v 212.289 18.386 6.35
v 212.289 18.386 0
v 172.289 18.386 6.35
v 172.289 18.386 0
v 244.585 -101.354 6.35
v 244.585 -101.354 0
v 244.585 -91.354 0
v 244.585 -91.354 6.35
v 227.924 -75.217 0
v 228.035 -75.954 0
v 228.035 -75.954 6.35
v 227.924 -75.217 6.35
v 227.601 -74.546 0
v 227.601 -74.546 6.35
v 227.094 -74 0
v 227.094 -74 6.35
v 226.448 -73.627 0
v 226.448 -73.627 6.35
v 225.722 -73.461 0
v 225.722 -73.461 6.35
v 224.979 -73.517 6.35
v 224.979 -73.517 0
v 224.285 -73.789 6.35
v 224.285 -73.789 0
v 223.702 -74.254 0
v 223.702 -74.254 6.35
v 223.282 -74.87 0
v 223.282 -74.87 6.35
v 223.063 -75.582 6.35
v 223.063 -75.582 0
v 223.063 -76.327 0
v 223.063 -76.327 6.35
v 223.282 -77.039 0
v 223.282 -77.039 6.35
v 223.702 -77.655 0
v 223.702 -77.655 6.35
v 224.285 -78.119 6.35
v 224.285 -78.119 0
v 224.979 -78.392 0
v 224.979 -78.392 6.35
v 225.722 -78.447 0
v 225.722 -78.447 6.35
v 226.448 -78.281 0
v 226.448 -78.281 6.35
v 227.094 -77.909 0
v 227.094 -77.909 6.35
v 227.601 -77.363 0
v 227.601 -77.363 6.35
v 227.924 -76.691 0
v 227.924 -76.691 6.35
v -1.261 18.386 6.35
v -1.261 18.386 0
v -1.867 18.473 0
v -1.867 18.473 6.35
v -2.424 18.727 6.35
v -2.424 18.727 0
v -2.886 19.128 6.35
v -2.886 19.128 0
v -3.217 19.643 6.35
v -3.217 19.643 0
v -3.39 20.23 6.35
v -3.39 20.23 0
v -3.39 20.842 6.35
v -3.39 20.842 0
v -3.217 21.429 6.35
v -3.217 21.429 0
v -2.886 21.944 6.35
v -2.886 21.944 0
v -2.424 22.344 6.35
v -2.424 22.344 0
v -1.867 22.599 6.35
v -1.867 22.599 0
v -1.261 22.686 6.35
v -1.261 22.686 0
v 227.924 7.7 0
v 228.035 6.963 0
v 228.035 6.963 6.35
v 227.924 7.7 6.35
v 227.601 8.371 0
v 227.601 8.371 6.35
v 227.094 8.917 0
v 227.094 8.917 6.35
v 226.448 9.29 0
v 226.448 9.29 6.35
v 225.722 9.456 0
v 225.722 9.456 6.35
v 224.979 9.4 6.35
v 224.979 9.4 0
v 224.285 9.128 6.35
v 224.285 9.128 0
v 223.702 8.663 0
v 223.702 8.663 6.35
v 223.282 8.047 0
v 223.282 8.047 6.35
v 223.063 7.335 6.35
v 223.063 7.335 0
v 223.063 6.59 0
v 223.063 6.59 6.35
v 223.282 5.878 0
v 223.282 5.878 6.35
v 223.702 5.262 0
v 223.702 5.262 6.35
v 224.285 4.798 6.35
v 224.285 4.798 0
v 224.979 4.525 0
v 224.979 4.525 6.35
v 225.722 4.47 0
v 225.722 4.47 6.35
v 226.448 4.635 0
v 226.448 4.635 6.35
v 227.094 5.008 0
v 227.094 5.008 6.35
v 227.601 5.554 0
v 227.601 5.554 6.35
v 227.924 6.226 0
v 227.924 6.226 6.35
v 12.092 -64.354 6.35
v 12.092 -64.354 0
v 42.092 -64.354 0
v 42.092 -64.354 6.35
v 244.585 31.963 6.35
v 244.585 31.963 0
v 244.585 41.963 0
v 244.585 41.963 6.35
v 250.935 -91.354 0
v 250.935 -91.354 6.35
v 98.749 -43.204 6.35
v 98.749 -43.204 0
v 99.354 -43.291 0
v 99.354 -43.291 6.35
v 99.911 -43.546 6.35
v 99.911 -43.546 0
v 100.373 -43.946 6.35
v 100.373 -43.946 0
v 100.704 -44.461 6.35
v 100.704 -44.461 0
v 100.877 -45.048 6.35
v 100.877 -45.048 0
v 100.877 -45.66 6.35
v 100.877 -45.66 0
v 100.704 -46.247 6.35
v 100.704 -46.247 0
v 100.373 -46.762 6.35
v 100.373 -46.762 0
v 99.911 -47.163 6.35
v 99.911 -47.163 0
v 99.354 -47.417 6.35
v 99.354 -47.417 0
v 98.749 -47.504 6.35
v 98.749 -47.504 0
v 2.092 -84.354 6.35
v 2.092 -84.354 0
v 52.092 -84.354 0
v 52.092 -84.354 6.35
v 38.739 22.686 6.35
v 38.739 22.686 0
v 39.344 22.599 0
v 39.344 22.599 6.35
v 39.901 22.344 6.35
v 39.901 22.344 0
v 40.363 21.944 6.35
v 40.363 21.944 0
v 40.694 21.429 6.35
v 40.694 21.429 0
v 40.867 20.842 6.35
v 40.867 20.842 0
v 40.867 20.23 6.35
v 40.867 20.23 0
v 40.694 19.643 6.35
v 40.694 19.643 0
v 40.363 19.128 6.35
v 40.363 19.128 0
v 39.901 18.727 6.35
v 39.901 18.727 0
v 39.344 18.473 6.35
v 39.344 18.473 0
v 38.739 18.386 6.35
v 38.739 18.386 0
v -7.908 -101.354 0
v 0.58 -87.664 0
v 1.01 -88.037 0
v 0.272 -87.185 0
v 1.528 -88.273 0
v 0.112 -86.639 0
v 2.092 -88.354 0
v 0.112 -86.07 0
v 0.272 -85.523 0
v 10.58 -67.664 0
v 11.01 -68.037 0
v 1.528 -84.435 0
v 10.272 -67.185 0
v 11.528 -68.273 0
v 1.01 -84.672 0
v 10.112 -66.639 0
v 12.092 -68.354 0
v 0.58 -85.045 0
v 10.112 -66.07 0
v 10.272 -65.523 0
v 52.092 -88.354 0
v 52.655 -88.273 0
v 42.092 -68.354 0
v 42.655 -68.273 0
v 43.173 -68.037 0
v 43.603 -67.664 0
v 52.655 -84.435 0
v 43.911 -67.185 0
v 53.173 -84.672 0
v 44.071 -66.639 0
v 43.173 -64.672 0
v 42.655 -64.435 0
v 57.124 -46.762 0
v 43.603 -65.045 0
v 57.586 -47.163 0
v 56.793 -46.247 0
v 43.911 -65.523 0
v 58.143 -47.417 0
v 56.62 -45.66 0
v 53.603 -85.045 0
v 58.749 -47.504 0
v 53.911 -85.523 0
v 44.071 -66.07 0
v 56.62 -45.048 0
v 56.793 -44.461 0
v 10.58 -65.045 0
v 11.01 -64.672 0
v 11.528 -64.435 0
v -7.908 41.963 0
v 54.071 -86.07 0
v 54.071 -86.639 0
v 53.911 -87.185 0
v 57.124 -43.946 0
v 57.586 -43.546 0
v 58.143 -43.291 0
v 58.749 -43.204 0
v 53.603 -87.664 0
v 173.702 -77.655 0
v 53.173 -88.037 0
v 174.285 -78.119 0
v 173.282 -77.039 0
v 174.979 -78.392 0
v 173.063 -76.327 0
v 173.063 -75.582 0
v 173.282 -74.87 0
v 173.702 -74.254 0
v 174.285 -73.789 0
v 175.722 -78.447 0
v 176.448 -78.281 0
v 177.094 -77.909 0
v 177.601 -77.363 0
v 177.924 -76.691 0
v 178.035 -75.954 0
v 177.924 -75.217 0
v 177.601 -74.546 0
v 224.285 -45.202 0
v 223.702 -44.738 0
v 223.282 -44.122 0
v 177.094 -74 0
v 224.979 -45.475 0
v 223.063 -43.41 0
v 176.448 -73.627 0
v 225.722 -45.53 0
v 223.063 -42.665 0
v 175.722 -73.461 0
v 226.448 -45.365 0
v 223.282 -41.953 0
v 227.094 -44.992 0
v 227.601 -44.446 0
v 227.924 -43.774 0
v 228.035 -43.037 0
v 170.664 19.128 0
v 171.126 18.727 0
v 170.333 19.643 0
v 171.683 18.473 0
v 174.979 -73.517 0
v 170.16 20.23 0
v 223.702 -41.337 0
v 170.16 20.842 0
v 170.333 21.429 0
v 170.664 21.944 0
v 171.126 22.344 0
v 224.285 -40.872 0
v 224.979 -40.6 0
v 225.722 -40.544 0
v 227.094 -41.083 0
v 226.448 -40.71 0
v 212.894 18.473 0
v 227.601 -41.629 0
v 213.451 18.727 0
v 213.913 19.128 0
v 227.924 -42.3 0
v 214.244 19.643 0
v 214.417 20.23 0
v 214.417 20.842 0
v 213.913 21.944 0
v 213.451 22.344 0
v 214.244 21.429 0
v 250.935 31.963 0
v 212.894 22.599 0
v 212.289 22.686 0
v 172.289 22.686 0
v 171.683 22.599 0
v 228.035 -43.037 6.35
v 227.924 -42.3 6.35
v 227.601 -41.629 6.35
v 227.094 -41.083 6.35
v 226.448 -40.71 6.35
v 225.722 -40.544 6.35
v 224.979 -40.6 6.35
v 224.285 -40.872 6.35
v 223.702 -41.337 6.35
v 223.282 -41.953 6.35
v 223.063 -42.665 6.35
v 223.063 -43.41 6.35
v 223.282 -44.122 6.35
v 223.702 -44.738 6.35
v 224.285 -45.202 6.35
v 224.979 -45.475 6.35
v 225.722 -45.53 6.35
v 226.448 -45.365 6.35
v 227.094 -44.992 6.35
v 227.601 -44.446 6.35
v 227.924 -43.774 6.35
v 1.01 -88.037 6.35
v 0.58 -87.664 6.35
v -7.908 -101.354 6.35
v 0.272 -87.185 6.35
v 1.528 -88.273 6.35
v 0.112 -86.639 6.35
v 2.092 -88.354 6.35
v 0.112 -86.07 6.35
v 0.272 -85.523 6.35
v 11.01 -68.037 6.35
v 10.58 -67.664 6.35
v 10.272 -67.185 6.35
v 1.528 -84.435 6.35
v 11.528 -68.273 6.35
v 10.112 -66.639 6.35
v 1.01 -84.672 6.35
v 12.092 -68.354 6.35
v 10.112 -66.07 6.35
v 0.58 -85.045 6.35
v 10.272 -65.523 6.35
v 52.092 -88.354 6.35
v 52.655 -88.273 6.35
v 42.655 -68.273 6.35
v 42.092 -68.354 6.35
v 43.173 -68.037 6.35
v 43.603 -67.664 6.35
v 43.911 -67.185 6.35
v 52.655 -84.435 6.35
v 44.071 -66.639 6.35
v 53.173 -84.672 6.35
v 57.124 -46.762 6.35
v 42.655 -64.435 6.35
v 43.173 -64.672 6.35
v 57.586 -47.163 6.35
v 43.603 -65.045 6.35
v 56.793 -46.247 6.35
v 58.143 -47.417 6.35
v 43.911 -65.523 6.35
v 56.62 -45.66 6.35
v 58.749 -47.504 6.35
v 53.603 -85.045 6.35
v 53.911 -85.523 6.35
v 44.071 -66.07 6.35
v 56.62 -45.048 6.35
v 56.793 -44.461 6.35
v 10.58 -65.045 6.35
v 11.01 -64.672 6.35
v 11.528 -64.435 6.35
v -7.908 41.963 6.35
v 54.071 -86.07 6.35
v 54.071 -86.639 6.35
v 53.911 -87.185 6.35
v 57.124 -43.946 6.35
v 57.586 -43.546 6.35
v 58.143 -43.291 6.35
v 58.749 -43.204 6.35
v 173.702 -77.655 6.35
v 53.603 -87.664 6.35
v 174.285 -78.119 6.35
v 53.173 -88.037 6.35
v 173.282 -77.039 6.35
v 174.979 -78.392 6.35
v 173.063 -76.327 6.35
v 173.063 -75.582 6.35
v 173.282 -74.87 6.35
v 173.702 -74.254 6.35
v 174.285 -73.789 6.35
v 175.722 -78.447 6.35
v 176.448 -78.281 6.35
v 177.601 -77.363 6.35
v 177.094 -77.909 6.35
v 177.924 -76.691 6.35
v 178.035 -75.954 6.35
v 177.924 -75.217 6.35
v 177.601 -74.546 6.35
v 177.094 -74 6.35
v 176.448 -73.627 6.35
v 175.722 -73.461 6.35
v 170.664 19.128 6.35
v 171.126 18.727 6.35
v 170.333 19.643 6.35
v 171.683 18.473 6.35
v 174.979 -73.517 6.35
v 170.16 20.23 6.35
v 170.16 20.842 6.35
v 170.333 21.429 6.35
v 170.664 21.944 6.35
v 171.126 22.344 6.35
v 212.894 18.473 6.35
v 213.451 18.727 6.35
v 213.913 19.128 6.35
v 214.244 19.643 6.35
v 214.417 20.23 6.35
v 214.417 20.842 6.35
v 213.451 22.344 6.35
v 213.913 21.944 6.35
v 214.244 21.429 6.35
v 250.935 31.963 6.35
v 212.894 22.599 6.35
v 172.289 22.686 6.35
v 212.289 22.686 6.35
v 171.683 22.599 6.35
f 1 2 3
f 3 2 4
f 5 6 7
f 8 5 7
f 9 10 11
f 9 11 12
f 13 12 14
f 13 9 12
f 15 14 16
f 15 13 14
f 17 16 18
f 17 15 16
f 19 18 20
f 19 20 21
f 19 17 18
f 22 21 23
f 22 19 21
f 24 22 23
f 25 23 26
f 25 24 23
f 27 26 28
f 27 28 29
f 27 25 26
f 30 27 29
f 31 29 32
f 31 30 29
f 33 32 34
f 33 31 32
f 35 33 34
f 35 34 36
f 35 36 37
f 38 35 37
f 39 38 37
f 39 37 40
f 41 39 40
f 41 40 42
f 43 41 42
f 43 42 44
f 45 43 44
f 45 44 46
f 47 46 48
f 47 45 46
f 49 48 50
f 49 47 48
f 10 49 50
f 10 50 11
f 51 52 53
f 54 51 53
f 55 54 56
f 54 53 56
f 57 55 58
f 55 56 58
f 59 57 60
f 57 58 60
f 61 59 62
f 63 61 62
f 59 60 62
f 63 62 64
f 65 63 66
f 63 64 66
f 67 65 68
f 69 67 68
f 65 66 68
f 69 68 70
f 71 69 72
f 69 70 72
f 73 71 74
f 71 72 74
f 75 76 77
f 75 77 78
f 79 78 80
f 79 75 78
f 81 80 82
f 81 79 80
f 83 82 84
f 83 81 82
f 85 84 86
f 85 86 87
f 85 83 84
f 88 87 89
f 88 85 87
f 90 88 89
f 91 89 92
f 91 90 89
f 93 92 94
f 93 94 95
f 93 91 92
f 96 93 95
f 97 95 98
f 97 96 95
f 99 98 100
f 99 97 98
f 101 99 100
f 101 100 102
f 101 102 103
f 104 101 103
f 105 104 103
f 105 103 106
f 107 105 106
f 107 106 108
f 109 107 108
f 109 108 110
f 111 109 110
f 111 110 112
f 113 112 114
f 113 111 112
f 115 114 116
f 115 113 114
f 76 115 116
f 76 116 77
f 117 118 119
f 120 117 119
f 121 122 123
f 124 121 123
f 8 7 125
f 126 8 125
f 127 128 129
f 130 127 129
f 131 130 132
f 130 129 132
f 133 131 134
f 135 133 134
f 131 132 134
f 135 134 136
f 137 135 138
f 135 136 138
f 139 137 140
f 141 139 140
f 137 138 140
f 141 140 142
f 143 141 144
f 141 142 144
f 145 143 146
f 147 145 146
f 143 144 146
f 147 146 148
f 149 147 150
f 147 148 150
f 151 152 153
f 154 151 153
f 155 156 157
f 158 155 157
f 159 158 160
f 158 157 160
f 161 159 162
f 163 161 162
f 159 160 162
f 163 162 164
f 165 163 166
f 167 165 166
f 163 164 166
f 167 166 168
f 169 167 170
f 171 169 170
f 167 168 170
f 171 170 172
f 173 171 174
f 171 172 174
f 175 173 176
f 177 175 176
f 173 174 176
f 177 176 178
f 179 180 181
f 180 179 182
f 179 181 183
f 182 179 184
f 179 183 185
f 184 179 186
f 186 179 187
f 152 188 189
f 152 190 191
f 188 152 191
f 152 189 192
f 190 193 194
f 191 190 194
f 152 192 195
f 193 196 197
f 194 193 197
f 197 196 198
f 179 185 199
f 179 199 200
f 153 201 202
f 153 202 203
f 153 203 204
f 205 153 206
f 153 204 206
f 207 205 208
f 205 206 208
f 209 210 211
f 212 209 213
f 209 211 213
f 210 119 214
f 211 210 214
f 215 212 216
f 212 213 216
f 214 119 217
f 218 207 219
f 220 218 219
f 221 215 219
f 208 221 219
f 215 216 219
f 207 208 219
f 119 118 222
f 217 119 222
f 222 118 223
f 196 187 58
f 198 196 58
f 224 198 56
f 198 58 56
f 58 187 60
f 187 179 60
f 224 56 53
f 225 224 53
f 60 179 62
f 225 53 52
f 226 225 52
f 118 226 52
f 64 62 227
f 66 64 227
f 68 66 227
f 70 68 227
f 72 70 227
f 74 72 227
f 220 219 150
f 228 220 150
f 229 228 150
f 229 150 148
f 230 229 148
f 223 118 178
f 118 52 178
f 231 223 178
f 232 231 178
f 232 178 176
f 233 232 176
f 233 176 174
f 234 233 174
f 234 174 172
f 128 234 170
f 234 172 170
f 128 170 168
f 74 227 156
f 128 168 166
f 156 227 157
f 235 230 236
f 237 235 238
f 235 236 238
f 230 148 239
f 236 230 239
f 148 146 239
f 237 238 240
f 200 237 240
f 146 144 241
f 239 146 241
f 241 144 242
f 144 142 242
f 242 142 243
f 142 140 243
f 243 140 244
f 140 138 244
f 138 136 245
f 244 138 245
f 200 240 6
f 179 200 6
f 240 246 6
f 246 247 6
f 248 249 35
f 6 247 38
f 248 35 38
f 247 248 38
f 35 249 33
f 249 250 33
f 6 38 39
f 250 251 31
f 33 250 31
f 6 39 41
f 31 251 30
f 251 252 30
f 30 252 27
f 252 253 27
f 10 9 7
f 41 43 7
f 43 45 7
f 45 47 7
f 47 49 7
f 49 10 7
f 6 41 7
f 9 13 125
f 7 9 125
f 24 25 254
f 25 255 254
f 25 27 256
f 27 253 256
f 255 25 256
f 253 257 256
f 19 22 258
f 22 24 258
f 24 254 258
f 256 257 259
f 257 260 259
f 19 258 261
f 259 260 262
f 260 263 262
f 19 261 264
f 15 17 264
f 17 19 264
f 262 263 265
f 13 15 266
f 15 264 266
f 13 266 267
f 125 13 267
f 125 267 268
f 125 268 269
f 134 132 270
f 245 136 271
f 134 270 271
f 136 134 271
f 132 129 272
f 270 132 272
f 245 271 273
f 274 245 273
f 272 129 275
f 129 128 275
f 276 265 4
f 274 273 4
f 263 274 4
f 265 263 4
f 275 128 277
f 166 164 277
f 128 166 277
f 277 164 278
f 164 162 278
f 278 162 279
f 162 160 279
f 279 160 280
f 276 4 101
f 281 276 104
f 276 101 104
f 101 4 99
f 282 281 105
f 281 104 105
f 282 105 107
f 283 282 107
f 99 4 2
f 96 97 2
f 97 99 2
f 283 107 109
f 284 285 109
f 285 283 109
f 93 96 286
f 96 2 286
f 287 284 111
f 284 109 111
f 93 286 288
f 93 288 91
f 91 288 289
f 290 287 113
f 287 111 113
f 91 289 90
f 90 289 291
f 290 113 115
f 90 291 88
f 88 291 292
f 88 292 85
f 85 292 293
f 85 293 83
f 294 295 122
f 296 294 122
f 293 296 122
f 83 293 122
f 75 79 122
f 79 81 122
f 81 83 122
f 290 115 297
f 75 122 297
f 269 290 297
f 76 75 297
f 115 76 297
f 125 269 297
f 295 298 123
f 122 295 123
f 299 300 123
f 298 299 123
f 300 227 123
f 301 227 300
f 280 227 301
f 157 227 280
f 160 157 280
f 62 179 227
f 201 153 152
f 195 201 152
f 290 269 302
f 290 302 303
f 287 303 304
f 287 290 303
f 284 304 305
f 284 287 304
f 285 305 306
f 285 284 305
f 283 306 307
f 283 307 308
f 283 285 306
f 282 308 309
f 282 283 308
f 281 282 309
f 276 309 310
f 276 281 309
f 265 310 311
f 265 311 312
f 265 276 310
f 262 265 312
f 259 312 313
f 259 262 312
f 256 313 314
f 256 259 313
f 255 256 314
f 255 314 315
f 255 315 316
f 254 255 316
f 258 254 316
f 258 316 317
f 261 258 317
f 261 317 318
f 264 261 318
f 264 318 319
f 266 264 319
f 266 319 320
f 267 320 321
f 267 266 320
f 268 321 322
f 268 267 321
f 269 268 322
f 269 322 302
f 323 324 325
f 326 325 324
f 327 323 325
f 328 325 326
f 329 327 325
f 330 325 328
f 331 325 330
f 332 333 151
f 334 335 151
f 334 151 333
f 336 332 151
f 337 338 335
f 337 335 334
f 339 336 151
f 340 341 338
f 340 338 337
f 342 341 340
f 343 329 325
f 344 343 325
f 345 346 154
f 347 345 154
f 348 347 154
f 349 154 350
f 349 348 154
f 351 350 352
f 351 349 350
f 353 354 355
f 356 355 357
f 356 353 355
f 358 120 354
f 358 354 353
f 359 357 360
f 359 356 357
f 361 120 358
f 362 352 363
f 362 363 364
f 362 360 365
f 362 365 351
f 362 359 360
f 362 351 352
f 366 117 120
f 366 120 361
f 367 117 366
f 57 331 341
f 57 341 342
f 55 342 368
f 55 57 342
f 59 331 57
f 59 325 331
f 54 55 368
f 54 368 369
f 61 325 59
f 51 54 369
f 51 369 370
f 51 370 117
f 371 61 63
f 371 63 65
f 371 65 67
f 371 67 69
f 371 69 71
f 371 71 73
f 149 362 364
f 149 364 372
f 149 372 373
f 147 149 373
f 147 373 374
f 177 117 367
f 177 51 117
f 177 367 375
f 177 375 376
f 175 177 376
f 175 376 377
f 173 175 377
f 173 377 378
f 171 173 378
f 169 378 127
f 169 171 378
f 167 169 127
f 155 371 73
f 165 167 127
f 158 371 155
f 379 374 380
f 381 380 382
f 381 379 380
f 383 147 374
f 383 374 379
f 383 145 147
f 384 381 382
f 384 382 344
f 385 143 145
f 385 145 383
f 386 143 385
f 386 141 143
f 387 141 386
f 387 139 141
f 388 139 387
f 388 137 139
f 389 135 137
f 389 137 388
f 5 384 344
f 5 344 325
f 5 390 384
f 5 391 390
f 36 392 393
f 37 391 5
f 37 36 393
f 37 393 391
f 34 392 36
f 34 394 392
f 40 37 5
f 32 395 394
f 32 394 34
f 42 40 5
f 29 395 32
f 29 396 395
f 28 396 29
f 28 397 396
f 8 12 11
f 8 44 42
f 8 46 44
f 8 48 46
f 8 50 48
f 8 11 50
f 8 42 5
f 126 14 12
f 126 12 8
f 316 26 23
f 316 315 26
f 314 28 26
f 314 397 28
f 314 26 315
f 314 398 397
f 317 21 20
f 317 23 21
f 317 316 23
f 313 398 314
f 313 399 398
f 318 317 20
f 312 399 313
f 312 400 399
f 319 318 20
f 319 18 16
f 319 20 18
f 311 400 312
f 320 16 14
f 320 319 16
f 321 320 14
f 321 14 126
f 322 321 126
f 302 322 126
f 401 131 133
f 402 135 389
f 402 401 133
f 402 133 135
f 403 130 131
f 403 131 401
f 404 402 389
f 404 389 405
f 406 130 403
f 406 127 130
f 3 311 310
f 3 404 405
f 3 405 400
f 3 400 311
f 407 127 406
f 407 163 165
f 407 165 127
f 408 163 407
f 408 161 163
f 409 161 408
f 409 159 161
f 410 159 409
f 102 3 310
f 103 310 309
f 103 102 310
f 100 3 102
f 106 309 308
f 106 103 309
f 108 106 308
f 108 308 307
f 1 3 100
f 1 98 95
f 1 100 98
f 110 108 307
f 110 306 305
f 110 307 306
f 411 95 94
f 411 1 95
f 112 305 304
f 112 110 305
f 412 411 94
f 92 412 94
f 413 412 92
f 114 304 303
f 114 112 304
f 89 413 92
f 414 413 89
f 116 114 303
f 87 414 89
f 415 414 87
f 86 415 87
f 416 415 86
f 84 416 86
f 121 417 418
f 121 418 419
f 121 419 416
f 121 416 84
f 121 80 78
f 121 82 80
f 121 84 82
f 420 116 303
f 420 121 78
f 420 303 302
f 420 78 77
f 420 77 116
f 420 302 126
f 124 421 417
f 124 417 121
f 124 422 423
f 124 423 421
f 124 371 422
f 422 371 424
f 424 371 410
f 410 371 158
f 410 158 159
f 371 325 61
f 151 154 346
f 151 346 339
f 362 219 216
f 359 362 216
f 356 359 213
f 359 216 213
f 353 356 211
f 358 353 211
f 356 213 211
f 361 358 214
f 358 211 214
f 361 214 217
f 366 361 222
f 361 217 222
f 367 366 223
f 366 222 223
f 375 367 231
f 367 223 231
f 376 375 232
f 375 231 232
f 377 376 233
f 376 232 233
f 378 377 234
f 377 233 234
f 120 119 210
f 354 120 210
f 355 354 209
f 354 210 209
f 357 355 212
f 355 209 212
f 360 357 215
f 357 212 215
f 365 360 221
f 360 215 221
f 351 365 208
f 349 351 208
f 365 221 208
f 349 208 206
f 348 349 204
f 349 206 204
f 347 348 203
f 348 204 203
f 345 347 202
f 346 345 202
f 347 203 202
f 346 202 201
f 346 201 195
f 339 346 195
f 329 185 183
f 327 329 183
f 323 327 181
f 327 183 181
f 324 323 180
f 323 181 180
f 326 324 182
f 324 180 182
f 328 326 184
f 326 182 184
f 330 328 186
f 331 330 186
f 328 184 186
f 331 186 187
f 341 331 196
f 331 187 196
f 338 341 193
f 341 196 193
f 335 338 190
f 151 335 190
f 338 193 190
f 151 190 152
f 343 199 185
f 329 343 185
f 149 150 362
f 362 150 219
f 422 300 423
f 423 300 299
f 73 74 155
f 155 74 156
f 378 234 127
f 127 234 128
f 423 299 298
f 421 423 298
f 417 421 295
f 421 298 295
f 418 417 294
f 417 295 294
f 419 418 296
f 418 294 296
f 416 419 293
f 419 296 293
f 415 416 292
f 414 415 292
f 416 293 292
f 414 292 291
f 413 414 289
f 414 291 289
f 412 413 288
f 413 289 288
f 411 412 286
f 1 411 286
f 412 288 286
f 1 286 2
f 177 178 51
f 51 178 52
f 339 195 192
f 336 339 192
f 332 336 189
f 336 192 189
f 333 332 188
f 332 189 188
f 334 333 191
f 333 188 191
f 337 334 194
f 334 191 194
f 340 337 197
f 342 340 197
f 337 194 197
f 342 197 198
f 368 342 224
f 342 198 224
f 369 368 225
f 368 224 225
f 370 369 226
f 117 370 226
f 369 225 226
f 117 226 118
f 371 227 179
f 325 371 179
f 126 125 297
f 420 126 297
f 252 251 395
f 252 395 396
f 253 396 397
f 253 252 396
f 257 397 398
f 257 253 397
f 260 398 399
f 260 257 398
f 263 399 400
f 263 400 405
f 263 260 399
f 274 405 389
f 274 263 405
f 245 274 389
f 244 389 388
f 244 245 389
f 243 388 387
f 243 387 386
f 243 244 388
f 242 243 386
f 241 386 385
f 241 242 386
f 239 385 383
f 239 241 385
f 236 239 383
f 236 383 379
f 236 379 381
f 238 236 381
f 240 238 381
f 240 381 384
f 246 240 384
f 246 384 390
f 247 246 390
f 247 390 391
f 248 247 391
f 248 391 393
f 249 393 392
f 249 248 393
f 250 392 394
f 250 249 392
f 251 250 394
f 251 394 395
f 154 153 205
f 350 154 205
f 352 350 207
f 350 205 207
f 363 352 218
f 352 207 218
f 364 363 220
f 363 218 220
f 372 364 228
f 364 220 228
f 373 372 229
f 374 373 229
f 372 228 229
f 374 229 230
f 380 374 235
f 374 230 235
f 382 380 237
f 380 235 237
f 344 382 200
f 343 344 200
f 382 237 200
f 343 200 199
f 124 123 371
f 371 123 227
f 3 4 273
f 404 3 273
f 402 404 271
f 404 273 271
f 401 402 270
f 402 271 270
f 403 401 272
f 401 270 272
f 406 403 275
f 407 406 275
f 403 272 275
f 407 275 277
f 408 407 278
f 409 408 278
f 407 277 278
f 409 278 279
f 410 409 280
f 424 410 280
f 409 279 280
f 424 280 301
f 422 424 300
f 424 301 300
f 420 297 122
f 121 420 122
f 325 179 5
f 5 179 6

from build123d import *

# Parameters (mm, degrees)
SKETCH3_R           = 2.5
BOSS_EXTRUDE1_DEPTH = 6.35


with BuildPart() as part:
    # Sketch3 → Boss-Extrude1 (new body)
    with BuildSketch(Plane.XY):
        Polygon((244.584917863, 41.962665812), (-7.908318612, 41.962665812), (-7.908318612, -101.354312852), (244.584917863, -101.354312852), (244.584917863, -91.354312852), (250.934917863, -91.354312852), (250.934917863, 31.962665812), (244.584917863, 31.962665812), align=None)
        with Locations((225.534917863, -43.037334188)):
            Circle(SKETCH3_R, mode=Mode.SUBTRACT)
        with Locations((225.534917863, 6.962665812)):
            Circle(SKETCH3_R, mode=Mode.SUBTRACT)
        with Locations((225.534917863, -75.954312852)):
            Circle(SKETCH3_R, mode=Mode.SUBTRACT)
        with Locations((175.534917863, -75.954312852)):
            Circle(SKETCH3_R, mode=Mode.SUBTRACT)
        with BuildLine():
            Line((58.748599203, -43.204312852), (98.748599203, -43.204312852))
            ThreePointArc((98.748599203, -43.204312852), (100.898599203, -45.354312852), (98.748599203, -47.504312852))
            Line((98.748599203, -47.504312852), (58.748599203, -47.504312852))
            ThreePointArc((58.748599203, -47.504312852), (56.598599203, -45.354312852), (58.748599203, -43.204312852))
        make_face(mode=Mode.SUBTRACT)
        with BuildLine():
            Line((-1.261400797, 22.685687148), (38.738599203, 22.685687148))
            ThreePointArc((38.738599203, 22.685687148), (40.888599203, 20.535687148), (38.738599203, 18.385687148))
            Line((38.738599203, 18.385687148), (-1.261400797, 18.385687148))
            ThreePointArc((-1.261400797, 18.385687148), (-3.411400797, 20.535687148), (-1.261400797, 22.685687148))
        make_face(mode=Mode.SUBTRACT)
        with BuildLine():
            Line((172.288599203, 22.685687148), (212.288599203, 22.685687148))
            ThreePointArc((212.288599203, 22.685687148), (214.438599203, 20.535687148), (212.288599203, 18.385687148))
            Line((212.288599203, 18.385687148), (172.288599203, 18.385687148))
            ThreePointArc((172.288599203, 18.385687148), (170.138599203, 20.535687148), (172.288599203, 22.685687148))
        make_face(mode=Mode.SUBTRACT)
        with BuildLine():
            Line((12.091681388, -64.354312852), (42.091681388, -64.354312852))
            ThreePointArc((42.091681388, -64.354312852), (44.091681388, -66.354312852), (42.091681388, -68.354312852))
            Line((42.091681388, -68.354312852), (12.091681388, -68.354312852))
            ThreePointArc((12.091681388, -68.354312852), (10.091681388, -66.354312852), (12.091681388, -64.354312852))
        make_face(mode=Mode.SUBTRACT)
        with BuildLine():
            Line((2.091681388, -84.354312852), (52.091681388, -84.354312852))
            ThreePointArc((52.091681388, -84.354312852), (54.091681388, -86.354312852), (52.091681388, -88.354312852))
            Line((52.091681388, -88.354312852), (2.091681388, -88.354312852))
            ThreePointArc((2.091681388, -88.354312852), (0.091681388, -86.354312852), (2.091681388, -84.354312852))
        make_face(mode=Mode.SUBTRACT)
    extrude(amount=BOSS_EXTRUDE1_DEPTH)


solid = part.part
